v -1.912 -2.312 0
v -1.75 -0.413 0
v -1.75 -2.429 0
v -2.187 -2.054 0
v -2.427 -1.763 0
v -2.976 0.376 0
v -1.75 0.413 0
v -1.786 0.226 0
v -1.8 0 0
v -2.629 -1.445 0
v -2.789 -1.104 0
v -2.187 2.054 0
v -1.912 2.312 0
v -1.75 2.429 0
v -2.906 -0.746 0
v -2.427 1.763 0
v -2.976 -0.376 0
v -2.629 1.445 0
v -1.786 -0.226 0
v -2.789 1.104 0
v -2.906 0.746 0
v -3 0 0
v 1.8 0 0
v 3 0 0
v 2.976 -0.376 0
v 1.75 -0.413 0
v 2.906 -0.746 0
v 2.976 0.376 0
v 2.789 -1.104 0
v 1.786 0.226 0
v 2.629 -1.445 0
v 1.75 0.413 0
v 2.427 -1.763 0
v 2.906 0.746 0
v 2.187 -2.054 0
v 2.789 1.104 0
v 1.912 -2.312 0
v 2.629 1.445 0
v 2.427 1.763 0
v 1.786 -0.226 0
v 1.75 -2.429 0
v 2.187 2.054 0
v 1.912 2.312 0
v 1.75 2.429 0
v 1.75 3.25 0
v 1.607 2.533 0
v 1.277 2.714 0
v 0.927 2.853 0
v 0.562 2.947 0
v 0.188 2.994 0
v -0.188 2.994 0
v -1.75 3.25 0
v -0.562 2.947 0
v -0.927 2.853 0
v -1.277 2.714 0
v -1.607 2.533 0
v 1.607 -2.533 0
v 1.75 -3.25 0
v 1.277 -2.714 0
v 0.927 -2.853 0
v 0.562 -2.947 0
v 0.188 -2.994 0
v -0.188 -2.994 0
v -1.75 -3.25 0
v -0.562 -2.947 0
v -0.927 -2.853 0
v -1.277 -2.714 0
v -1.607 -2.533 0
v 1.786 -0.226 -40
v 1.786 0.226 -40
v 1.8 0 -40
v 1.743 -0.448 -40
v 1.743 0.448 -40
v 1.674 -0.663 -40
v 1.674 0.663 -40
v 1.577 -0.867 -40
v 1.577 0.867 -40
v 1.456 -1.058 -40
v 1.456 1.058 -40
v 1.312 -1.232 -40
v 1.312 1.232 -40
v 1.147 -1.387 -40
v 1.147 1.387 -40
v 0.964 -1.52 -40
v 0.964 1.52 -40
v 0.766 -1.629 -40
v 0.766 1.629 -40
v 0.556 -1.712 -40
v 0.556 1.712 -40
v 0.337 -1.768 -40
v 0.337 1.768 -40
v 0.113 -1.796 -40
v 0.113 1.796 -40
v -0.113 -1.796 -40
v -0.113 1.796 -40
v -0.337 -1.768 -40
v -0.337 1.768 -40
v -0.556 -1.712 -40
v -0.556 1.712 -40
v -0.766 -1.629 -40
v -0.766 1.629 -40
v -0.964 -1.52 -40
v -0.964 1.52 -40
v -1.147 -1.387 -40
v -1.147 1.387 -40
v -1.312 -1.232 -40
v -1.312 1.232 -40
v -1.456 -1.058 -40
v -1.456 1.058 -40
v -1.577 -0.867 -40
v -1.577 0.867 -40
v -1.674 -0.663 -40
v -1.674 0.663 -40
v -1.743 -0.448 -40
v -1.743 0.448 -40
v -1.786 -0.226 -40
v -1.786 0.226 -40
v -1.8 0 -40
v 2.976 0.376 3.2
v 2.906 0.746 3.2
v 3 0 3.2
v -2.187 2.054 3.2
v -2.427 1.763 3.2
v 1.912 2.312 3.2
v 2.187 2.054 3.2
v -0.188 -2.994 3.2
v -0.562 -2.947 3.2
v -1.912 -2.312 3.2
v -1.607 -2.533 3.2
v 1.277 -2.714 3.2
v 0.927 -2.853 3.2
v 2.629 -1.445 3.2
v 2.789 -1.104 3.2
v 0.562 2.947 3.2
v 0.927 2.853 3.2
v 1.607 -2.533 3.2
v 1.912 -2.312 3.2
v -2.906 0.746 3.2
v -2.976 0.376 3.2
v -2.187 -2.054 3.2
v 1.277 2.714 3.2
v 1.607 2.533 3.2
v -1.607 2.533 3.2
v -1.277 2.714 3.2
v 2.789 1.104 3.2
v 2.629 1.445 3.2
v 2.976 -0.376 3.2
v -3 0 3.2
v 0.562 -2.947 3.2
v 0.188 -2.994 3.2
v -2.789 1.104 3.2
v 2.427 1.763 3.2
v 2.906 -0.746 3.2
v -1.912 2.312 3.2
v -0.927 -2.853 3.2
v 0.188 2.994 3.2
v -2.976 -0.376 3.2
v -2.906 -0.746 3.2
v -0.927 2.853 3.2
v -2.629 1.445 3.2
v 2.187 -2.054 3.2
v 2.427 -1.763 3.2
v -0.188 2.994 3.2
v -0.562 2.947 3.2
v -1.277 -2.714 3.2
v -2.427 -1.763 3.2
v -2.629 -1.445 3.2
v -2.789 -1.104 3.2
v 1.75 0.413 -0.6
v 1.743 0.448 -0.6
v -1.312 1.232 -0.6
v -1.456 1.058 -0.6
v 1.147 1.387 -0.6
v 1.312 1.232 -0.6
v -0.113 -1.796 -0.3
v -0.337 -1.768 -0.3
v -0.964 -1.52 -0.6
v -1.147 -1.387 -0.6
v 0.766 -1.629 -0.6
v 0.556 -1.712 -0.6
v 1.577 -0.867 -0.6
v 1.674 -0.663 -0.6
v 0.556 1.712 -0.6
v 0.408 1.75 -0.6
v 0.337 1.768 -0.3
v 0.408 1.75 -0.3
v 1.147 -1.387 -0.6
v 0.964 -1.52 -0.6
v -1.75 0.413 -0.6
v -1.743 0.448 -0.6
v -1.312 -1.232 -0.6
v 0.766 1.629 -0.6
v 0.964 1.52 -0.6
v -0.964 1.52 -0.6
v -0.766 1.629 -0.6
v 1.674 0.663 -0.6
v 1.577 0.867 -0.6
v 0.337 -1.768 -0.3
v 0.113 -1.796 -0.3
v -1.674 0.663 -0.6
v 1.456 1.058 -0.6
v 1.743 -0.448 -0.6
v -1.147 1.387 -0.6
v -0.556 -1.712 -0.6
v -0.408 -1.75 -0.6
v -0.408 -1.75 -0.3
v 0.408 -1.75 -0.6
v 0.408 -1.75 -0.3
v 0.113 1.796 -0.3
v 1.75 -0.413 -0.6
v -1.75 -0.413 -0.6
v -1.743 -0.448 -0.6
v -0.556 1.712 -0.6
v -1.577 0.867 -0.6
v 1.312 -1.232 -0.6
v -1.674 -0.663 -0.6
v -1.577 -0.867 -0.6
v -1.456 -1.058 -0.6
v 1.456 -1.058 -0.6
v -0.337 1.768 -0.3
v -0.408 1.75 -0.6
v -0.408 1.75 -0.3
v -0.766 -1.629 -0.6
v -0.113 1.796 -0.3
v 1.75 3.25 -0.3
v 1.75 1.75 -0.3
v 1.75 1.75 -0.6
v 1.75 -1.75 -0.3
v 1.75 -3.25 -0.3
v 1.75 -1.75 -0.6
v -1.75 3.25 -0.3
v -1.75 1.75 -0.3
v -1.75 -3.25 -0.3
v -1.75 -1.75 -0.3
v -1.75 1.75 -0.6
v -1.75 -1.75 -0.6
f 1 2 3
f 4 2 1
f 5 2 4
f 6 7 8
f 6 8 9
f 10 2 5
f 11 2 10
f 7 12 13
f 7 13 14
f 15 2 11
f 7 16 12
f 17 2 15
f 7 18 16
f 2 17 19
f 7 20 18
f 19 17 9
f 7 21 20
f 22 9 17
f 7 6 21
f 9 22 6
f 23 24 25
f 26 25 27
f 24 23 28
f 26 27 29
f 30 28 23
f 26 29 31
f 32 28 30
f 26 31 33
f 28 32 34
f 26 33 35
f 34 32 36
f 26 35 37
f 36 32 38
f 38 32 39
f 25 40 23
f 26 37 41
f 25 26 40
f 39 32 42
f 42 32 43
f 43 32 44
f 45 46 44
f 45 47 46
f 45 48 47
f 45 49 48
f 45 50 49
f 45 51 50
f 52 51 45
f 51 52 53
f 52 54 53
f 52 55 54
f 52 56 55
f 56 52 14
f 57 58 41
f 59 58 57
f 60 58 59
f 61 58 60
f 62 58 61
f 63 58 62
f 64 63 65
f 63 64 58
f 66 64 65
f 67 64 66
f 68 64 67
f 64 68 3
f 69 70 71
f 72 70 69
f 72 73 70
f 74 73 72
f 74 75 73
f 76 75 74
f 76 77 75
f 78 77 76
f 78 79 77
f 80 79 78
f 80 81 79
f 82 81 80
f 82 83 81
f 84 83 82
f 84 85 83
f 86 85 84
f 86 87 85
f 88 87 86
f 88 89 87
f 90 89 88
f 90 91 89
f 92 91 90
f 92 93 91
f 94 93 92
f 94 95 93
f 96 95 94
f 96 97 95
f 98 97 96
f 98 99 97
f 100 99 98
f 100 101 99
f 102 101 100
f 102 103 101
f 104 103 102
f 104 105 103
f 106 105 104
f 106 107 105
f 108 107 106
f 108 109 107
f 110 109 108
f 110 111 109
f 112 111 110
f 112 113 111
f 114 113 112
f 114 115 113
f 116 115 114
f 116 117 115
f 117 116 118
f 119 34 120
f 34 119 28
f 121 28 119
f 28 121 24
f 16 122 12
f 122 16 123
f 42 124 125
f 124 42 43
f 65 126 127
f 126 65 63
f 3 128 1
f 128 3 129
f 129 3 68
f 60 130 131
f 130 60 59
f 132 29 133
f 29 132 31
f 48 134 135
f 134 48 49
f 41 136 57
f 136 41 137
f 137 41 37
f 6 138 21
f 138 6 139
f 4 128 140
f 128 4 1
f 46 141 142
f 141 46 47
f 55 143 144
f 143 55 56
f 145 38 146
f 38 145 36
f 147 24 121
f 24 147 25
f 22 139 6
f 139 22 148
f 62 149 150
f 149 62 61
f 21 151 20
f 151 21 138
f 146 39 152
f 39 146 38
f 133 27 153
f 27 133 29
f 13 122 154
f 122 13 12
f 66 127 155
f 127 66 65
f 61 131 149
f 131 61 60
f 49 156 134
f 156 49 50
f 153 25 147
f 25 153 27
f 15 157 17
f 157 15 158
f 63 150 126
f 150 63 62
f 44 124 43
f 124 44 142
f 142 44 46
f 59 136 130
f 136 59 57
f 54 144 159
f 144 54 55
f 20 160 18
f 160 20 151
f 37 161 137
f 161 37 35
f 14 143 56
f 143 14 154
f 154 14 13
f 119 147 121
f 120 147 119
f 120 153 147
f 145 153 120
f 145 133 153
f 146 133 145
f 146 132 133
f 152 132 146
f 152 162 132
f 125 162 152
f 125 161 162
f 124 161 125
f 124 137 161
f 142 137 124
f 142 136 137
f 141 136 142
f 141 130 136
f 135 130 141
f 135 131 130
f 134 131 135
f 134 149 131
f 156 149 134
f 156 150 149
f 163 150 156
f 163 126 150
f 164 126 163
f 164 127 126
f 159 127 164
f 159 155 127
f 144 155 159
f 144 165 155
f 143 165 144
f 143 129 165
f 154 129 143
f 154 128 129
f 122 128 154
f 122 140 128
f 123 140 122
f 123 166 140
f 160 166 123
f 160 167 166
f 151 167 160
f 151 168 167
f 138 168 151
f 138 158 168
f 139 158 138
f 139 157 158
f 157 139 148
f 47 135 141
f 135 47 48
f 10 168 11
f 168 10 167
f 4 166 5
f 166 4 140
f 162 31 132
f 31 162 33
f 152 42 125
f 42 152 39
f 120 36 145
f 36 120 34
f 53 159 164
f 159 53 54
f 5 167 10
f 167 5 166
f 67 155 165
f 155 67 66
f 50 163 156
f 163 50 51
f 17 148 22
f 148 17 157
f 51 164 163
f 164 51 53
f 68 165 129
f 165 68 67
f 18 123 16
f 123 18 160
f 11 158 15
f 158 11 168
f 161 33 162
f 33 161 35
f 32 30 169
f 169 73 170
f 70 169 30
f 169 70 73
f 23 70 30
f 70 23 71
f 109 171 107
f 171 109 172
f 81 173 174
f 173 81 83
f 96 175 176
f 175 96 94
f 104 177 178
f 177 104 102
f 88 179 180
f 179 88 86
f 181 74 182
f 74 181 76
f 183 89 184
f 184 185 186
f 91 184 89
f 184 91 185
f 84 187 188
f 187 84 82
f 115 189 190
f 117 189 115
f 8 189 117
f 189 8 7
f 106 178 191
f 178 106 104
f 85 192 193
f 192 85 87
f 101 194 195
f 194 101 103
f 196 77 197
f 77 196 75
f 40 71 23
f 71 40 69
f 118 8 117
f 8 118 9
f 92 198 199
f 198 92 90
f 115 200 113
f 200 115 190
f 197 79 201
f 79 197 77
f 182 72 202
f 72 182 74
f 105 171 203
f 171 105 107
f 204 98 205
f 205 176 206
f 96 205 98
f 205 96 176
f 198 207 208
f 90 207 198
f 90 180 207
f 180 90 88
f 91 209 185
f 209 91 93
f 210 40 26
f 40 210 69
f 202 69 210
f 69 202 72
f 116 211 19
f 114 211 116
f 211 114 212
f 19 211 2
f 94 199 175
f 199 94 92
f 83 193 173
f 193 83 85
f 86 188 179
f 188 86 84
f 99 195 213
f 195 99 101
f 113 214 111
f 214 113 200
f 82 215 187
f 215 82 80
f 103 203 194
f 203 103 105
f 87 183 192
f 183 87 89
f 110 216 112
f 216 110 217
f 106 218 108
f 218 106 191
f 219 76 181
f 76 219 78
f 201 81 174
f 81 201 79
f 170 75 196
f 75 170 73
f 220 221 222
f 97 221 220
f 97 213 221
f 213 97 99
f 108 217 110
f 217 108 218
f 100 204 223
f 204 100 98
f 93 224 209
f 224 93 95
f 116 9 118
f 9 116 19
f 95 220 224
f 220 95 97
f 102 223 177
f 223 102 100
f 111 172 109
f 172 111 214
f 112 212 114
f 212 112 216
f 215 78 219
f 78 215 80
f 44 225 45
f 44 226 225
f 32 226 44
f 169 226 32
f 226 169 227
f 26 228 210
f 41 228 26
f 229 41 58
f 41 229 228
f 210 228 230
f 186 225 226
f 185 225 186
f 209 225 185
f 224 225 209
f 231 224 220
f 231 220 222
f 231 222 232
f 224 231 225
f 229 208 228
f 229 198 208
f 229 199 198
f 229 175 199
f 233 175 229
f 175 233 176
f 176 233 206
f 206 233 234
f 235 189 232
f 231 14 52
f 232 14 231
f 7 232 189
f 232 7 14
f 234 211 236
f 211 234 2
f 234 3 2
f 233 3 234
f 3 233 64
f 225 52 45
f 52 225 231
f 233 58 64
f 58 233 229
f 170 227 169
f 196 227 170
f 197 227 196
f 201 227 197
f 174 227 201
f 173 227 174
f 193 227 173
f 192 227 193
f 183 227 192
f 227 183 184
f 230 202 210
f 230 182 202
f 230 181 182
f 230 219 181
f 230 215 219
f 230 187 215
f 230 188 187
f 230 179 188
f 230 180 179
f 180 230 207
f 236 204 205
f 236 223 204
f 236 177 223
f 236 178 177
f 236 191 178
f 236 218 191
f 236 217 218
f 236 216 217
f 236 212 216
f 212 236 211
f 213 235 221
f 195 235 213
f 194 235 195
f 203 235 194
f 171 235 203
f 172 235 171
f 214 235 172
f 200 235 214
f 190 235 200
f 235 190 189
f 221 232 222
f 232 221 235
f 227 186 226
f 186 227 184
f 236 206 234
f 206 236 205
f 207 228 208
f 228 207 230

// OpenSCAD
$fn = 50;


difference() {
	union() {
		translate(v = [0, 0, 0]) {
			rotate(a = [0, 0, 0]) {
				difference() {
					union() {
						translate(v = [0, 0, -40.0000000000]) {
							cylinder(h = 40, r = 1.5000000000);
						}
						cylinder(h = 3.2000000000, r = 3.0000000000);
						translate(v = [0, 0, -40.0000000000]) {
							cylinder(h = 40, r = 1.8000000000);
						}
						translate(v = [-1.7500000000, -3.2500000000, -0.3000000000]) {
							cube(size = [3.5000000000, 6.5000000000, 0.3000000000]);
						}
						translate(v = [-1.7500000000, -1.7500000000, -0.6000000000]) {
							cube(size = [3.5000000000, 3.5000000000, 0.3000000000]);
						}
						translate(v = [0, 0, -40.0000000000]) {
							cylinder(h = 40, r = 1.5000000000);
						}
					}
					union();
				}
			}
		}
	}
	union();
}
